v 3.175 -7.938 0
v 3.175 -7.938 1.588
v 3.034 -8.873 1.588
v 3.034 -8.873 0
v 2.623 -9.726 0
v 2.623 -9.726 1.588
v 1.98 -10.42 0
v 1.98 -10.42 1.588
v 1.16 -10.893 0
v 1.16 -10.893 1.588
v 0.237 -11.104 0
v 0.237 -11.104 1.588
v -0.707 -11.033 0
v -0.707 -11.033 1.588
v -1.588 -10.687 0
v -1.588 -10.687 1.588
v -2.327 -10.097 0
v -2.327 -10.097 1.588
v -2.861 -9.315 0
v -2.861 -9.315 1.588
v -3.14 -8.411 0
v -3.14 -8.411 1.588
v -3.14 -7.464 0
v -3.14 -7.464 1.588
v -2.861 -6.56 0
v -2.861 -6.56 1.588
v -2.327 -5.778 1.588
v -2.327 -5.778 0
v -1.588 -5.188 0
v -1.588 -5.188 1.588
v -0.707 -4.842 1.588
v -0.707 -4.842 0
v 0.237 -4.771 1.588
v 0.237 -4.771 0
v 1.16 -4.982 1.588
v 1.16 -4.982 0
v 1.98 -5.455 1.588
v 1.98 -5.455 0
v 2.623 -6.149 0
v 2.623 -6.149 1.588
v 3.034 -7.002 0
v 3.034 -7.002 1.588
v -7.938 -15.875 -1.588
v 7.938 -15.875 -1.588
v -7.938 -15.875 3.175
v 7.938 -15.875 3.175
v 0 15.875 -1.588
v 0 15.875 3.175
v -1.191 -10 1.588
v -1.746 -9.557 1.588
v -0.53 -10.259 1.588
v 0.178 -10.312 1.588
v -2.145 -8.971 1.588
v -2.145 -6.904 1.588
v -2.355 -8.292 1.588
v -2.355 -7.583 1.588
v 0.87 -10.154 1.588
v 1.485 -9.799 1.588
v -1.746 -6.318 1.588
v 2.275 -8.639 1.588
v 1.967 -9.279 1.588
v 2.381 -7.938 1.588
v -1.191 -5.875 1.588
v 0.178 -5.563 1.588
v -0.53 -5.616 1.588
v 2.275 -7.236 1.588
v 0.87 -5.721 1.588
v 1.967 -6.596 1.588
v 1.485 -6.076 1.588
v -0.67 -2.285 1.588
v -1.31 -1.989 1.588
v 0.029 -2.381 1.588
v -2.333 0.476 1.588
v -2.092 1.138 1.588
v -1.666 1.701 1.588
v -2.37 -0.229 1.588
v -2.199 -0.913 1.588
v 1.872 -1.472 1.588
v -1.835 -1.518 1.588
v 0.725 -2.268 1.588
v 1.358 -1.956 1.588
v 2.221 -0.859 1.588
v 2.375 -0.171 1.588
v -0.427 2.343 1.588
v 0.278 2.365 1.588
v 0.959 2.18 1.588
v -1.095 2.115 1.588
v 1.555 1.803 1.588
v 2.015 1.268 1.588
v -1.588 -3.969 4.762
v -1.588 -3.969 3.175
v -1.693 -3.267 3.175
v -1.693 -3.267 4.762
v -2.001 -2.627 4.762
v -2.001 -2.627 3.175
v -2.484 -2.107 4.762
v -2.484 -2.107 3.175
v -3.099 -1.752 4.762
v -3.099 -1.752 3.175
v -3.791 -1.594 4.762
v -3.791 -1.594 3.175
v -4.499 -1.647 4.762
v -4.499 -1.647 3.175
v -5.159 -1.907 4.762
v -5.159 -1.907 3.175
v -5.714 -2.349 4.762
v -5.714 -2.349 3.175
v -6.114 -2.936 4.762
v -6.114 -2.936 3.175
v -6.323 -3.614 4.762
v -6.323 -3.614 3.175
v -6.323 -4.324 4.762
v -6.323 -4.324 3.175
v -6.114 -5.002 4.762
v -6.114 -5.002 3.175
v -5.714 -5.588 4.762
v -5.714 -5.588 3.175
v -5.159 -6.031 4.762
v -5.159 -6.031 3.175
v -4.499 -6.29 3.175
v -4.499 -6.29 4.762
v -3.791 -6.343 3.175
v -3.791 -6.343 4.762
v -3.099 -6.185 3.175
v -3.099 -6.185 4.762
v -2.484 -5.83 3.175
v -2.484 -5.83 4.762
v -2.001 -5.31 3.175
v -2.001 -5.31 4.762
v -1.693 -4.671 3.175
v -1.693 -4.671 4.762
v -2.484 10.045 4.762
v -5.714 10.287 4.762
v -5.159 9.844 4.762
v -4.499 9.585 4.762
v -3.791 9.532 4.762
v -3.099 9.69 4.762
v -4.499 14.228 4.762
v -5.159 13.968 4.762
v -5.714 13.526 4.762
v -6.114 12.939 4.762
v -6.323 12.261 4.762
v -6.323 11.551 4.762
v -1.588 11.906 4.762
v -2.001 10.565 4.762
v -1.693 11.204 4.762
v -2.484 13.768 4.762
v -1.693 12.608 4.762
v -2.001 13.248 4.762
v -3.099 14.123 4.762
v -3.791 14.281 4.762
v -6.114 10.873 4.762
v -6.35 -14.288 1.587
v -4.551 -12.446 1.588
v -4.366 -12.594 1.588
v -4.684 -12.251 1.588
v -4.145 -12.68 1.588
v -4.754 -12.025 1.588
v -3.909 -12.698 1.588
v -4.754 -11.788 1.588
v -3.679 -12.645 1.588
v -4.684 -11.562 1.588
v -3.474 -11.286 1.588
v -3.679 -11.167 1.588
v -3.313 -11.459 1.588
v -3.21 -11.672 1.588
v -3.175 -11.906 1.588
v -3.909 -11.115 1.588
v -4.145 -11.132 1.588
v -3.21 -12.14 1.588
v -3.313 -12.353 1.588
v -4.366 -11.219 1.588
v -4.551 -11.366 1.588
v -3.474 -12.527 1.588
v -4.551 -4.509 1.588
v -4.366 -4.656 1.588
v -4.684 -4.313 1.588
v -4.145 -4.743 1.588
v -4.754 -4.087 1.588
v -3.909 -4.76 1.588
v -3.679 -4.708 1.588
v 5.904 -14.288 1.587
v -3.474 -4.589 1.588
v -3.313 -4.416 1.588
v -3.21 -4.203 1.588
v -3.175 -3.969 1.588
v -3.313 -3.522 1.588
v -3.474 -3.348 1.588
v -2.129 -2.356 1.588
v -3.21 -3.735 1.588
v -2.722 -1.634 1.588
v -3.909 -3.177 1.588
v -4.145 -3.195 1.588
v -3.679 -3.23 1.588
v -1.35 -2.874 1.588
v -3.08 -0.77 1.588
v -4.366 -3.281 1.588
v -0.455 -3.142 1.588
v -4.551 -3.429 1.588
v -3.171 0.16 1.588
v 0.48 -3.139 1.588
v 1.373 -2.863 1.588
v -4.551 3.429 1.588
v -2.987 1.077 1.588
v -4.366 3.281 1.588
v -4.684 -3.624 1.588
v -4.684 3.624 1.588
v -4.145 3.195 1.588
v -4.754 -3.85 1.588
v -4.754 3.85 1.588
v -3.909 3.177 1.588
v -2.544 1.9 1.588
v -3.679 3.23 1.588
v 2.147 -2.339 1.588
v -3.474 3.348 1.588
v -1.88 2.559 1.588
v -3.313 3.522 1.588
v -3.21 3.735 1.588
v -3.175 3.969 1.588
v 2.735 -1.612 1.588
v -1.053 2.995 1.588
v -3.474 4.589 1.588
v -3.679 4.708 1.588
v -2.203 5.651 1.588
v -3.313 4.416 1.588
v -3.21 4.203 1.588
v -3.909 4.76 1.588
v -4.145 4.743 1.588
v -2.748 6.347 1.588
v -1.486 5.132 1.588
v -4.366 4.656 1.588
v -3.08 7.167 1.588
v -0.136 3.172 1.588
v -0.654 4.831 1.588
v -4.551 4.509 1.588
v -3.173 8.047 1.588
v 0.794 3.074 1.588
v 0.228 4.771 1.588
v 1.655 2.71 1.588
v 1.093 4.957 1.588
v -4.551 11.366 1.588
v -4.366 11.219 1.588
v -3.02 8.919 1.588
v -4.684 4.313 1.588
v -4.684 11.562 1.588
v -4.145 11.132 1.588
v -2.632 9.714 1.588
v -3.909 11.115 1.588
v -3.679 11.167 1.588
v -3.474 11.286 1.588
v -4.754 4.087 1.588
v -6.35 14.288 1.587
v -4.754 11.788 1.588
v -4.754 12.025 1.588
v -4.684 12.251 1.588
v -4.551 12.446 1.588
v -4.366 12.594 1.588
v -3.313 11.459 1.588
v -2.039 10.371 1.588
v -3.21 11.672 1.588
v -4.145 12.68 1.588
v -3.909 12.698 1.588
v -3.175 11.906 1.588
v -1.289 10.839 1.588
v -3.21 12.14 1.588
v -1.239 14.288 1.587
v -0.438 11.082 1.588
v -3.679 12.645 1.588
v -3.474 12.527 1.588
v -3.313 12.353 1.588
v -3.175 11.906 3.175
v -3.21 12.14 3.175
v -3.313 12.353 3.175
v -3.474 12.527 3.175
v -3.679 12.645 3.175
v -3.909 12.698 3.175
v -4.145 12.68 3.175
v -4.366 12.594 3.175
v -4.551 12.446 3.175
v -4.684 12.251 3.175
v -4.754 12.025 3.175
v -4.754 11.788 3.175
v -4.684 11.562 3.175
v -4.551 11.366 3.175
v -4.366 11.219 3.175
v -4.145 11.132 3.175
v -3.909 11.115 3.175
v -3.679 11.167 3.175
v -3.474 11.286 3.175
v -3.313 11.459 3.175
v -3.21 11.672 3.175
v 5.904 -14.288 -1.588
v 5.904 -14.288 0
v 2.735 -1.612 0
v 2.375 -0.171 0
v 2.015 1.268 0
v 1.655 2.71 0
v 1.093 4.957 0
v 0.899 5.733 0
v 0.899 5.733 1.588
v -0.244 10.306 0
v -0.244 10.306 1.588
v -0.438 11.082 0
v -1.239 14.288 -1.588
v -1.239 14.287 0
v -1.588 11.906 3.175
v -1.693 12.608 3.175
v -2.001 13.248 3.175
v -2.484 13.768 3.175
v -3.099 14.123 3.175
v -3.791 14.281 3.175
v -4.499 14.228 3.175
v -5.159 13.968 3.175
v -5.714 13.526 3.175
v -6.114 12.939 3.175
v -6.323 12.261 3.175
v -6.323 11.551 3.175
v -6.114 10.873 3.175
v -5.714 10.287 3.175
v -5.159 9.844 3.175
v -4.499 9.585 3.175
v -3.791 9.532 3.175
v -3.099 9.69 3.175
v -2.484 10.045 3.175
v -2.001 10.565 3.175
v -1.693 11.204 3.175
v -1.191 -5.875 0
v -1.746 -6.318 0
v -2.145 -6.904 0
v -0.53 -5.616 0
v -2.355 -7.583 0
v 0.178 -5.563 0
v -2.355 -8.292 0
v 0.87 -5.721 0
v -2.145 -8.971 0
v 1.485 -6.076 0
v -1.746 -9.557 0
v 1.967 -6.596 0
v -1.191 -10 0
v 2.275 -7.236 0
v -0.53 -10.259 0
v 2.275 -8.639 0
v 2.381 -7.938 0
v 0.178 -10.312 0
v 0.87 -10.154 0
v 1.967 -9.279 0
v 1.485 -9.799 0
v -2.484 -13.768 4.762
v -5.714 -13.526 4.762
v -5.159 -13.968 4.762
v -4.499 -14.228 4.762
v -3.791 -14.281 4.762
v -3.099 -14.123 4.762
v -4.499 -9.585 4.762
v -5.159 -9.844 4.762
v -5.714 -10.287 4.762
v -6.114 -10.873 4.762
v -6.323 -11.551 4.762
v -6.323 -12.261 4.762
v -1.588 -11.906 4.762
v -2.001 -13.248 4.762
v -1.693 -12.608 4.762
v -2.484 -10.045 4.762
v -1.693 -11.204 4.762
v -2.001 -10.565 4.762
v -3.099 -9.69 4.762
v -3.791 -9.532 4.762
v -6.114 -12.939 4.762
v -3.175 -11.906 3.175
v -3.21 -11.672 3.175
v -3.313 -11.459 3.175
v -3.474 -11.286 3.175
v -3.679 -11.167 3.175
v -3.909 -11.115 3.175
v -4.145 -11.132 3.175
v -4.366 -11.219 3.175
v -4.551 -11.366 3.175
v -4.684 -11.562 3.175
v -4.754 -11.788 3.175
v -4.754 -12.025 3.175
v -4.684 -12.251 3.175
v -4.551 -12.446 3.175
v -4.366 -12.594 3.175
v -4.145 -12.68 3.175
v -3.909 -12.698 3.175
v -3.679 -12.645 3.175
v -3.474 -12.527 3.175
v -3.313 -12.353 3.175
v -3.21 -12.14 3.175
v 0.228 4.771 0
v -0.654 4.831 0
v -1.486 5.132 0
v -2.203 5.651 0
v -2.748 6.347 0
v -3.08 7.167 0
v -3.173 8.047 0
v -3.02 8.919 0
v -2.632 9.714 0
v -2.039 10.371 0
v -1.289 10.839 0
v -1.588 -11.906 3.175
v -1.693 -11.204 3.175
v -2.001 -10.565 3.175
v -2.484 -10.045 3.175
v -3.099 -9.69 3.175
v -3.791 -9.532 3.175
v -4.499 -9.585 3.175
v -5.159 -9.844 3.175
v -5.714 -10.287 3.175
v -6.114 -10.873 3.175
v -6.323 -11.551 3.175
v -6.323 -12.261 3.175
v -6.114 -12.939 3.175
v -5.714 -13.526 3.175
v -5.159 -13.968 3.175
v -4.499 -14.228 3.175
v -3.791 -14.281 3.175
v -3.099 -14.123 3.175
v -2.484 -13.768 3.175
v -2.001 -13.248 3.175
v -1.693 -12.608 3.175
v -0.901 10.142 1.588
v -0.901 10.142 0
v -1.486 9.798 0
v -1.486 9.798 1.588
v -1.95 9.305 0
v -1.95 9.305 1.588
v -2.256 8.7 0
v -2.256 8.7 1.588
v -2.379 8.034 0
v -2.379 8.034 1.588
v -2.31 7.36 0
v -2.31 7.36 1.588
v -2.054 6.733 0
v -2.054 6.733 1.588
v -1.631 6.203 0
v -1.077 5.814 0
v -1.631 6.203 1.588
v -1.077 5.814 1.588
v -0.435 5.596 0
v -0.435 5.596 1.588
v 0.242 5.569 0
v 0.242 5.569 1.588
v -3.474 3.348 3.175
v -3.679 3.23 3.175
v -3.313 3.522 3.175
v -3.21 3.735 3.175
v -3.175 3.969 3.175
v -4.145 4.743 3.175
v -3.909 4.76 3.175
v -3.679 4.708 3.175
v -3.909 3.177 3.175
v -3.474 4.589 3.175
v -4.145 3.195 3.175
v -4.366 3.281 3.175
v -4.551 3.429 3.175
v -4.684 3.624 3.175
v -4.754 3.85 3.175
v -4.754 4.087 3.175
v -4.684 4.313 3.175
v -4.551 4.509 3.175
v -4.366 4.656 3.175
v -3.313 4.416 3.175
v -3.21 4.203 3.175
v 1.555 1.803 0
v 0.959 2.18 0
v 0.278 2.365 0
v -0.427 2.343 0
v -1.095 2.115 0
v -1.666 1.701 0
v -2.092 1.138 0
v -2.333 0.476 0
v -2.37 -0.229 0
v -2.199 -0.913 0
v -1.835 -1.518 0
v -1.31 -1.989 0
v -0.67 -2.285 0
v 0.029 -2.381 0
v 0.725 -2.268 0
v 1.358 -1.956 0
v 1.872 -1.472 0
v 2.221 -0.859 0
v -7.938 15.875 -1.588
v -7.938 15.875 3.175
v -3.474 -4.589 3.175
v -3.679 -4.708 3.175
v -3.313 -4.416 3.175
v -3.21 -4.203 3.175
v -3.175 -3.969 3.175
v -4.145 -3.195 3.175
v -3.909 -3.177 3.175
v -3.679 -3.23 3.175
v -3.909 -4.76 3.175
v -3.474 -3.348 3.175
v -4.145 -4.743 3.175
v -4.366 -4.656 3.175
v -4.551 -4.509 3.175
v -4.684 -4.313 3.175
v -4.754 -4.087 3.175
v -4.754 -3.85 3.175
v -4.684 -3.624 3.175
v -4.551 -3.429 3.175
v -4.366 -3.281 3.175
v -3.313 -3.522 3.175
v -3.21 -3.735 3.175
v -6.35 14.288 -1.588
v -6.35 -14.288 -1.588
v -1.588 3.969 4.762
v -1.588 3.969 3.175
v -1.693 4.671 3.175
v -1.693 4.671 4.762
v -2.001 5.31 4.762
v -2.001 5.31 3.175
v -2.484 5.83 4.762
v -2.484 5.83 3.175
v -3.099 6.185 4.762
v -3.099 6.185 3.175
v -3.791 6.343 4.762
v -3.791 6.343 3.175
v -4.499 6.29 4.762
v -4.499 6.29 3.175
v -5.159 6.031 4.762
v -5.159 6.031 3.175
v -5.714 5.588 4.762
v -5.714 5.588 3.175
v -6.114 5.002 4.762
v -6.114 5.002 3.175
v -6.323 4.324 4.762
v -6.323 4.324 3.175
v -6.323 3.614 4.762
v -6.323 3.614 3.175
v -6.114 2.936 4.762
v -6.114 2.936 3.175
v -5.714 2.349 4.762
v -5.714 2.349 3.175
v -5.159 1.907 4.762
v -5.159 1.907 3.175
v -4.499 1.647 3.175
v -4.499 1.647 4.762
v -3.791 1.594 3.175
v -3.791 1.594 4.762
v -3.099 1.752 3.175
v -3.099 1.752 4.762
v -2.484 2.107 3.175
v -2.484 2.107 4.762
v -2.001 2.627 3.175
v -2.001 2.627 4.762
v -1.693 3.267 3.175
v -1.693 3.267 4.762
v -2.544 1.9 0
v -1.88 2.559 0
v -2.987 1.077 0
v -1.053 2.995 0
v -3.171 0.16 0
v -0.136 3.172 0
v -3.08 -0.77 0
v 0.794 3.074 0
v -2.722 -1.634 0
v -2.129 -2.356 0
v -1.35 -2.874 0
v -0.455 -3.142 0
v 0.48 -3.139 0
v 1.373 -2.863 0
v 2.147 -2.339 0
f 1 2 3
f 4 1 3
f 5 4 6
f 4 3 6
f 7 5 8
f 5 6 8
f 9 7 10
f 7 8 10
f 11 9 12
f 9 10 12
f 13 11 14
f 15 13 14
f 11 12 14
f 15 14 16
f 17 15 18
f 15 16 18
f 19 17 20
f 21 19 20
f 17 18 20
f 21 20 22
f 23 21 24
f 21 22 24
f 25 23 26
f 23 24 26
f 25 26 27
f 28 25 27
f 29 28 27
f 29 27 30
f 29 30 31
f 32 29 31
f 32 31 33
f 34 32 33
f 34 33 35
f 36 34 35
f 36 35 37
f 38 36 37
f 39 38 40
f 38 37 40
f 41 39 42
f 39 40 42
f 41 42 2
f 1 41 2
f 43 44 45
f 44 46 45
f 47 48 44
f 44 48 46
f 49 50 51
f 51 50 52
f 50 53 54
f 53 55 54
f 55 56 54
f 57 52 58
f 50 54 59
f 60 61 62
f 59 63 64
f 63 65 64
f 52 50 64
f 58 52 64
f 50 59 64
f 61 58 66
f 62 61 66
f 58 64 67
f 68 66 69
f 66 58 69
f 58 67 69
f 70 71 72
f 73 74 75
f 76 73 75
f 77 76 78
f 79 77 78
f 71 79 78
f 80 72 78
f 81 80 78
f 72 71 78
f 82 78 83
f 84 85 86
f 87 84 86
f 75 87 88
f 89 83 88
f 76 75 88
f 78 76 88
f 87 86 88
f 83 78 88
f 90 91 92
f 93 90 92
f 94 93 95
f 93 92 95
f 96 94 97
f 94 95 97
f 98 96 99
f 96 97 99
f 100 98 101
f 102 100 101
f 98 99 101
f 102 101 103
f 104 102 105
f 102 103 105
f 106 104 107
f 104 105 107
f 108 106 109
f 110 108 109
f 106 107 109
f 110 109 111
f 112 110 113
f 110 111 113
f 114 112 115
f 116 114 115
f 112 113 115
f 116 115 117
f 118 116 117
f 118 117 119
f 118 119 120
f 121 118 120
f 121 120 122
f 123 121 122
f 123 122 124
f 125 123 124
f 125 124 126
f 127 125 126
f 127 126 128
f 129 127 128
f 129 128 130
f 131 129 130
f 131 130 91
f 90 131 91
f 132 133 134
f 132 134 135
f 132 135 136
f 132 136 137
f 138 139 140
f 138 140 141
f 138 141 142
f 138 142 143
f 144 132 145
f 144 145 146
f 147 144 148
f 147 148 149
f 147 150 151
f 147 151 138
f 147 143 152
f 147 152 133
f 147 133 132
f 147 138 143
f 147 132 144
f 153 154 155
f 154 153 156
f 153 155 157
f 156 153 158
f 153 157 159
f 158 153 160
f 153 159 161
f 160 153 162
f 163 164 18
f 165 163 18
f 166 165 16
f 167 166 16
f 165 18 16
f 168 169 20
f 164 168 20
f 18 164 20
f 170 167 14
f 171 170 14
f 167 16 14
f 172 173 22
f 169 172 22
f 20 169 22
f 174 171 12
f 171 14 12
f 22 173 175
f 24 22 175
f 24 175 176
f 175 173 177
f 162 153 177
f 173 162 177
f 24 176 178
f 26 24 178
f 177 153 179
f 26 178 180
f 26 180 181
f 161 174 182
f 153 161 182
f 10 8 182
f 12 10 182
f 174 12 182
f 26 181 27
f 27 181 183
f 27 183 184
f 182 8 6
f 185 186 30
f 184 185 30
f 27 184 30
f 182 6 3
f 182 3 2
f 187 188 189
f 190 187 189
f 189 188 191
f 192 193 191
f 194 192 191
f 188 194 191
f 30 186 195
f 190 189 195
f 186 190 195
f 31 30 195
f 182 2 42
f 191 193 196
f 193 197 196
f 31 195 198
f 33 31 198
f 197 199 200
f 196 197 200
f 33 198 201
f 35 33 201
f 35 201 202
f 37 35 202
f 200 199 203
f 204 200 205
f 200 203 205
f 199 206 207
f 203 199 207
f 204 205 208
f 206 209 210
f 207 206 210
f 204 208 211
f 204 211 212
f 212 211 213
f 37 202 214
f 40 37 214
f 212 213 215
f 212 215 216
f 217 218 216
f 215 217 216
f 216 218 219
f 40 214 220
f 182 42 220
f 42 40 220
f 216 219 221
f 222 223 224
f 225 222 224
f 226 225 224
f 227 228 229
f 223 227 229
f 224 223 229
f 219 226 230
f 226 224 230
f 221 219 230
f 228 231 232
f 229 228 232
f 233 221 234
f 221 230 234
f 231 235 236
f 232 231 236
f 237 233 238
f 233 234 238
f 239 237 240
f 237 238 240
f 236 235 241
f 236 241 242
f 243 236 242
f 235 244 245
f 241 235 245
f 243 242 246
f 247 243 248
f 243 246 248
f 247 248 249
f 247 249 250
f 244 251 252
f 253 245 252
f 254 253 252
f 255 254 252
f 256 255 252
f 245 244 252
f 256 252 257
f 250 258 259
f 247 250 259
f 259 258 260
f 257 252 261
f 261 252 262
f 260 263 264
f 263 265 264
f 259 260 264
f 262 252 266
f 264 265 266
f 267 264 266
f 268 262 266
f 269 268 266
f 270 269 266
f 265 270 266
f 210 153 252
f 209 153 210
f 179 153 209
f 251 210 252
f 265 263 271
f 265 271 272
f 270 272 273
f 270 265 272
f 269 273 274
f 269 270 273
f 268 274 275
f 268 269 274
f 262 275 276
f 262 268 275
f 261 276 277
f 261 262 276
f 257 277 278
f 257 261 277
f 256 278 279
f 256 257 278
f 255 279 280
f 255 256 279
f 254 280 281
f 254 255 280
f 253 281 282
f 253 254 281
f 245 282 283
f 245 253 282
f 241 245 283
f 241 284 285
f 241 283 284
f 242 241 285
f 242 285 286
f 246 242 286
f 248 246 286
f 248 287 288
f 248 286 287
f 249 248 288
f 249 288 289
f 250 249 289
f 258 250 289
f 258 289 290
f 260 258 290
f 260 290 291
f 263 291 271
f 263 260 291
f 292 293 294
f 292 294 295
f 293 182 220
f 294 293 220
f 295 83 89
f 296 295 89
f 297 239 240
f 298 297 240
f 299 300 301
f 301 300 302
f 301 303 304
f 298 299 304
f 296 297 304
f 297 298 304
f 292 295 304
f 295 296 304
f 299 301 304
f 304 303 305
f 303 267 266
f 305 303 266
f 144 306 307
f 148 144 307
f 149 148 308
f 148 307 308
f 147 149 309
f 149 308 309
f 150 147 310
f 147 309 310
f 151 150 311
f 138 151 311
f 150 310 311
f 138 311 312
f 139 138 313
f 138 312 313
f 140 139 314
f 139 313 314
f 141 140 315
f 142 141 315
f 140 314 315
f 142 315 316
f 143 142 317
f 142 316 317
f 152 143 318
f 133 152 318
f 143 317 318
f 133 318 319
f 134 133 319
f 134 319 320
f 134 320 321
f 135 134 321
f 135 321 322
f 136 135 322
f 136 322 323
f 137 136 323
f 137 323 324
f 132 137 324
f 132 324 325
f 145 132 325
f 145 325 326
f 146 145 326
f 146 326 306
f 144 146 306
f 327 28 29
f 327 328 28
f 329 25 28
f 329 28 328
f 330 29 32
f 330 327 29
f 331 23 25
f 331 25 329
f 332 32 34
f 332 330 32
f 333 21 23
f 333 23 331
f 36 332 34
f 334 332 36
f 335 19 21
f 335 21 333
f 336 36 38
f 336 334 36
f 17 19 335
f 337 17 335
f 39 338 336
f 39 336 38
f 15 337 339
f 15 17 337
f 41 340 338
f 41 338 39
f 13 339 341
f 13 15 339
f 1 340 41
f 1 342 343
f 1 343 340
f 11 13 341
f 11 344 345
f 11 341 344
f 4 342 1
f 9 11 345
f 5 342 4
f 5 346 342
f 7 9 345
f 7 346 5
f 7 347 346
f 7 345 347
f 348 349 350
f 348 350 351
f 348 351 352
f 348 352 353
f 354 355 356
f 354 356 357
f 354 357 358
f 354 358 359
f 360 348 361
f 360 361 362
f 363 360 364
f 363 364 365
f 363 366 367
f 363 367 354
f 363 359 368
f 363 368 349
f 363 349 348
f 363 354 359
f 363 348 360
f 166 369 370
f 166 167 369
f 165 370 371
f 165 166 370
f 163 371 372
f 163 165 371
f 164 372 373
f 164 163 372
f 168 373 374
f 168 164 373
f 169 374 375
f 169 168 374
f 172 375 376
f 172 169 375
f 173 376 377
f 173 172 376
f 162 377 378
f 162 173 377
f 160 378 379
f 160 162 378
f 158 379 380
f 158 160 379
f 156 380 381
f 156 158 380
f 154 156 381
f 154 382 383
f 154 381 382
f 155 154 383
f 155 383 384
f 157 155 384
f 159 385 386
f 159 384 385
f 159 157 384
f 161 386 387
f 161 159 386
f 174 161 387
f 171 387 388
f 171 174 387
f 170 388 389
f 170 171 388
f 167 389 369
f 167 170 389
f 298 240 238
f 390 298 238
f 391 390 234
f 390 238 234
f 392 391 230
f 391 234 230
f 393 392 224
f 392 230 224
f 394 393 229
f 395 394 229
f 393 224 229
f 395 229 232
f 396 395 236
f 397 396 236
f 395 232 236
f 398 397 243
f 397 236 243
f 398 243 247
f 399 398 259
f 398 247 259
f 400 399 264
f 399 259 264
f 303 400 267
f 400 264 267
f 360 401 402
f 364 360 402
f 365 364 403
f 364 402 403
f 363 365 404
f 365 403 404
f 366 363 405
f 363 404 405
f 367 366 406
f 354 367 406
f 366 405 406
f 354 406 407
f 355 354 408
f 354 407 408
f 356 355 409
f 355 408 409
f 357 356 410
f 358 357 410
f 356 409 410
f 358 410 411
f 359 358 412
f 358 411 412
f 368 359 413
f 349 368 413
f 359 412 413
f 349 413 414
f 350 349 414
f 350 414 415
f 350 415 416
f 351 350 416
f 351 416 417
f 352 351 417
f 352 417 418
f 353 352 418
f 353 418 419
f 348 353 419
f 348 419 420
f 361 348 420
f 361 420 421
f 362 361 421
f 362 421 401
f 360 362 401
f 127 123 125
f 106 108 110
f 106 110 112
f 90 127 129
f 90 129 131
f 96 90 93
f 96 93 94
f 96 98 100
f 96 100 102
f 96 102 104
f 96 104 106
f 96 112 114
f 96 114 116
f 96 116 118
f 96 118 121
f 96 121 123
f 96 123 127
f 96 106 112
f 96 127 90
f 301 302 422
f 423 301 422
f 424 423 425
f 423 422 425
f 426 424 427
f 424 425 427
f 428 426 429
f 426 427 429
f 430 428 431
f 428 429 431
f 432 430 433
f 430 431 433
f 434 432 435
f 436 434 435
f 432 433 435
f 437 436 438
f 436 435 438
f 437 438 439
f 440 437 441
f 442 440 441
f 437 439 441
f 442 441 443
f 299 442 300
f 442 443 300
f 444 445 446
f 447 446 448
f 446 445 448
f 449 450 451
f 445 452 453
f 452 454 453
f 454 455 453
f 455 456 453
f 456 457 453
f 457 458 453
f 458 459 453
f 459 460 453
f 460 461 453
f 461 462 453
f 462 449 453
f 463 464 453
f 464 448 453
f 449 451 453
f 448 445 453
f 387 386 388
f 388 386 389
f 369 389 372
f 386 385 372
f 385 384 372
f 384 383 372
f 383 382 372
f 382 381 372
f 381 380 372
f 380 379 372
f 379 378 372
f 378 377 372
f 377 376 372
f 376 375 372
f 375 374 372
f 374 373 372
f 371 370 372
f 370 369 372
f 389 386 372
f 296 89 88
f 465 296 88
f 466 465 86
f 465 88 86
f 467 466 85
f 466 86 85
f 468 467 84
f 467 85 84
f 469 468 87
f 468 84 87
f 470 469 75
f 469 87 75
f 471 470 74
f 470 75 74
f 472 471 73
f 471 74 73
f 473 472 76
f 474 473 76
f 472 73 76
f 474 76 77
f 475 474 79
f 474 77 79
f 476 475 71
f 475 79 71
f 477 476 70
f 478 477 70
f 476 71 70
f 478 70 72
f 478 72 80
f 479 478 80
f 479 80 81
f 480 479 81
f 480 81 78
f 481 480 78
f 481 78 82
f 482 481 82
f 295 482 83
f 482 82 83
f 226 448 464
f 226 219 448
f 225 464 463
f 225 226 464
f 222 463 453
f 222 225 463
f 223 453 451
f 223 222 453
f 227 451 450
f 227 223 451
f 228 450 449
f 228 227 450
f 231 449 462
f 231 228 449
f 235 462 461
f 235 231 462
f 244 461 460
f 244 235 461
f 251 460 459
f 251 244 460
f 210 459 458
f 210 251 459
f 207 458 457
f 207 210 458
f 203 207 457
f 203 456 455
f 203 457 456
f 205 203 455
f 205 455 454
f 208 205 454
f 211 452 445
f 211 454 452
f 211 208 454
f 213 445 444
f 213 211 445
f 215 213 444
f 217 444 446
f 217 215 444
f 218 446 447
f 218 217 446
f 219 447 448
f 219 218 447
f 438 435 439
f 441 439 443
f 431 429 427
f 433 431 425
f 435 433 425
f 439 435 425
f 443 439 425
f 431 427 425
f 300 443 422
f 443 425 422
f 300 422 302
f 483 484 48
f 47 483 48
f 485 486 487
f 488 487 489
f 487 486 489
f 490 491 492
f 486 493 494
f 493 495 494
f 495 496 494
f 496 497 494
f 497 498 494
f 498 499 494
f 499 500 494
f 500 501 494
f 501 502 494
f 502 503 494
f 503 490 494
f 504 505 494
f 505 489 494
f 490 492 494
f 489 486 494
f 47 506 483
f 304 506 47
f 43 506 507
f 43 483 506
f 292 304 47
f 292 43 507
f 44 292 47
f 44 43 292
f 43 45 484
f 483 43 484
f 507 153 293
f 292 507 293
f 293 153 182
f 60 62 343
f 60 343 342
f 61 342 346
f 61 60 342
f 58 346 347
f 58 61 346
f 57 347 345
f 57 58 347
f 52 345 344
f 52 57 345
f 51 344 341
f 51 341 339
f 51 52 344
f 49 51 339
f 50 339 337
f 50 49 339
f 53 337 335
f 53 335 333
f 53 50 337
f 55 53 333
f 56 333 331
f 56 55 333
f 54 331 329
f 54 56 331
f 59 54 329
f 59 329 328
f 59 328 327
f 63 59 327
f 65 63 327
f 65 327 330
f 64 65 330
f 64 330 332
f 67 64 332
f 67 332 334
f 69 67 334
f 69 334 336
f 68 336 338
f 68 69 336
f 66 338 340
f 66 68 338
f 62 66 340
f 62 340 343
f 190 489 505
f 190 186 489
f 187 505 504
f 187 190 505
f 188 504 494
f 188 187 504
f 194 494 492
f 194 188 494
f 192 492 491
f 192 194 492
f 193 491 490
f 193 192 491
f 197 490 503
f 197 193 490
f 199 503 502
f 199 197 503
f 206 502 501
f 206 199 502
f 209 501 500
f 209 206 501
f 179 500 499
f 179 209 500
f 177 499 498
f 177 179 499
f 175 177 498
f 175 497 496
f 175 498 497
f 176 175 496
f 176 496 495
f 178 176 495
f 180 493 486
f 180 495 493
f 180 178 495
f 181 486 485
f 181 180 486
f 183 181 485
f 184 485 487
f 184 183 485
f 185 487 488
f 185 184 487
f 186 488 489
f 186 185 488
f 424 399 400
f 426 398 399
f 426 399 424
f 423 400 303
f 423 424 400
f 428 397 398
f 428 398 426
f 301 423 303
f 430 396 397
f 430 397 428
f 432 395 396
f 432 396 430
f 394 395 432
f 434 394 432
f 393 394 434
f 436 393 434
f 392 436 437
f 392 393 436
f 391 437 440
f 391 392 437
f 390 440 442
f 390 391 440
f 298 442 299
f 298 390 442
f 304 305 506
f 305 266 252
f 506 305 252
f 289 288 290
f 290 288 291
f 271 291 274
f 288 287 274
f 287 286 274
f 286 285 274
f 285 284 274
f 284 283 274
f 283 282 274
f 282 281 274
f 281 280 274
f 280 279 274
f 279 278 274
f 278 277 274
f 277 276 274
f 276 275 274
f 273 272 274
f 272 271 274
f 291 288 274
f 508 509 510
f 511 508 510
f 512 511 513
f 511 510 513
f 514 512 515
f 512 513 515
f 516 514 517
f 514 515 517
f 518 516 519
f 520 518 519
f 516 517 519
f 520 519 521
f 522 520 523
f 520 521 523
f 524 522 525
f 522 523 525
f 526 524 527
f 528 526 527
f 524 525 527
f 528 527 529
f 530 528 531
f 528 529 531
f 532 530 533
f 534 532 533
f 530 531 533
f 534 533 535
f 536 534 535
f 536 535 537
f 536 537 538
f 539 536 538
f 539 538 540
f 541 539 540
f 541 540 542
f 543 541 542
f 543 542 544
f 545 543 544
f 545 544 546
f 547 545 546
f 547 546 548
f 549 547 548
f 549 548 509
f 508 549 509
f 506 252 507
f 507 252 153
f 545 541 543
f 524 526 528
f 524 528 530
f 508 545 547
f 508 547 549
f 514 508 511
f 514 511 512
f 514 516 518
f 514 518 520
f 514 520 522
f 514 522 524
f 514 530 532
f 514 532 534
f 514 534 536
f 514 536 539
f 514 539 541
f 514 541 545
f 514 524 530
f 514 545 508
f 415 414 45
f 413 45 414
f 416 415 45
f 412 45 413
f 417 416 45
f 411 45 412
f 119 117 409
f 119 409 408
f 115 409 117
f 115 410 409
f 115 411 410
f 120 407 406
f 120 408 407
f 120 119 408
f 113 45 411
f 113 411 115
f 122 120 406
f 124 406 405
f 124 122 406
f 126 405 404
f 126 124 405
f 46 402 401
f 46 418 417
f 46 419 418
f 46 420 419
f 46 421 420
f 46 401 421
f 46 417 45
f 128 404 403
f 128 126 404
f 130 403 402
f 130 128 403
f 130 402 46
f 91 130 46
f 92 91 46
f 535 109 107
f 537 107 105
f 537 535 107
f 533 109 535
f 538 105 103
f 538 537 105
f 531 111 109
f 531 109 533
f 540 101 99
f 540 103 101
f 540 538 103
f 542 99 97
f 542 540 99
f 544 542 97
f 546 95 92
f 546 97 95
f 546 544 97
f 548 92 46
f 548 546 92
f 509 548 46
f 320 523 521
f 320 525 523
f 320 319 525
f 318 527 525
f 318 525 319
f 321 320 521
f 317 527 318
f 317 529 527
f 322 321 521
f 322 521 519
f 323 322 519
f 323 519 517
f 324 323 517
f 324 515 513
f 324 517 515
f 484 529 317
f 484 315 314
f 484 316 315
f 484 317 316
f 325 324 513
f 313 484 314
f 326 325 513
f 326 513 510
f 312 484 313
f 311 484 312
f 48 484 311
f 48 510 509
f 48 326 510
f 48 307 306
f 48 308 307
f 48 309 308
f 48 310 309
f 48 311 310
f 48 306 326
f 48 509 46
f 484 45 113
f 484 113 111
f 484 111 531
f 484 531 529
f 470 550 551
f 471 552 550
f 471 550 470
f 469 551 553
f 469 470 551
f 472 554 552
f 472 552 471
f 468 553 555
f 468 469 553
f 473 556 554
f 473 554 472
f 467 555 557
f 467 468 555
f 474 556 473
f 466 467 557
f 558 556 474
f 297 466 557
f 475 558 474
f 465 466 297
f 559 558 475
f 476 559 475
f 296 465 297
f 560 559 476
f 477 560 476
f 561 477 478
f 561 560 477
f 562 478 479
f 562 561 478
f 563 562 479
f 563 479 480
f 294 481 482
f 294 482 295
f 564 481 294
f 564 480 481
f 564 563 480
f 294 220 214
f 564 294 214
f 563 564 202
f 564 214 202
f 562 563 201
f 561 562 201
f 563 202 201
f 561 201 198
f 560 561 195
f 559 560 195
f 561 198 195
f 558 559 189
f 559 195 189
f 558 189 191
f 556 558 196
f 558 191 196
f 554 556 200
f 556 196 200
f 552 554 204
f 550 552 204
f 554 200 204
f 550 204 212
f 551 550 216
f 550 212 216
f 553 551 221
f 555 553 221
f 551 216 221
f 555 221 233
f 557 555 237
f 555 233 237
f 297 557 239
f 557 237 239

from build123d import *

# Parameters (mm, degrees)
F0_R     = 2.38125
F1_DEPTH = 3.175
F2_DEPTH = 4.7625
F3_T     = -1.5875
F4_R     = 3.175
F4_R_2   = 2.38125
F5_DEPTH = 1.5875


with BuildPart() as f1:
    # F0 (on Top) → F1 (new body)
    with BuildSketch(Plane.XY):
        Polygon((0, 15.875), (-7.9375, 15.875), (-7.9375, -15.875), (7.9375, -15.875), align=None)
        with Locations((-3.96875, -11.90625)):
            Circle(F0_R, mode=Mode.SUBTRACT)
        with Locations((-3.96875, -3.96875)):
            Circle(F0_R, mode=Mode.SUBTRACT)
        with Locations((-3.96875, 3.96875)):
            Circle(F0_R, mode=Mode.SUBTRACT)
        with Locations((-3.96875, 11.90625)):
            Circle(F0_R, mode=Mode.SUBTRACT)
    extrude(amount=F1_DEPTH)

    # F0 (on Top) → F2 (join)
    with BuildSketch(Plane.XY):
        with Locations((-3.96875, 11.90625)):
            Circle(F0_R)
        with Locations((-3.96875, 3.96875)):
            Circle(F0_R)
        with Locations((-3.96875, -3.96875)):
            Circle(F0_R)
        with Locations((-3.96875, -11.90625)):
            Circle(F0_R)
    extrude(amount=F2_DEPTH)

    # F3
    f3_openings = [f1.faces().sort_by_distance(p)[0] for p in [
        (-1.763889, -1.763889, 0),
    ]]
    offset(amount=F3_T, openings=f3_openings, kind=Kind.INTERSECTION)

    # F2_face (on face) + F4 (on face) → F5 (join)
    with BuildSketch(Plane(origin=(-1.7638745265, -1.3908157983, 0), x_dir=(1, 0, 0), z_dir=(0, 0, -1))):
        Polygon((-6.1736254735, -17.2658157983), (1.7638745265, -17.2658157983), (9.7013745265, 14.4841842017), (-6.1736254735, 14.4841842017), align=None)
        Polygon((0.5243919814, -15.6783157983), (-4.5861254735, -15.6783157983), (-4.5861254735, 12.8966842017), (7.6681419814, 12.8966842017), align=None, mode=Mode.SUBTRACT)
    with BuildSketch(Plane(origin=(0, 0, 1.5875), x_dir=(1, 0, 0), z_dir=(0, 0, -1))):
        with BuildLine():
            Line((0.8992491716, -5.7325731328), (1.0932302062, -4.9566489946))
            ThreePointArc((1.0932302062, -4.9566489946), (-3.080202438, -7.1674493905), (-0.4381385265, -11.0821239253))
            Line((-0.4381385265, -11.0821239253), (-0.244157492, -10.3061997871))
            ThreePointArc((-0.244157492, -10.3061997871), (-2.3101518285, -7.3599620429), (0.8992491716, -5.7325731328))
        make_face()
        with BuildLine():
            ThreePointArc((2.7353766172, 1.6119366495), (-3.080202438, 0.7700506095), (1.6550091801, -2.7095330988))
            Line((1.6550091801, -2.7095330988), (2.0152745824, -1.2684714896))
            ThreePointArc((2.0152745824, -1.2684714896), (-2.3101518285, 0.5775379571), (2.3751112149, 0.1708750402))
            Line((2.3751112149, 0.1708750402), (2.7353766172, 1.6119366495))
        make_face()
        with Locations((0, 7.9375)):
            Circle(F4_R)
        with Locations((0, 7.9375)):
            Circle(F4_R_2, mode=Mode.SUBTRACT)
    extrude(amount=F5_DEPTH)


solid = f1.part
